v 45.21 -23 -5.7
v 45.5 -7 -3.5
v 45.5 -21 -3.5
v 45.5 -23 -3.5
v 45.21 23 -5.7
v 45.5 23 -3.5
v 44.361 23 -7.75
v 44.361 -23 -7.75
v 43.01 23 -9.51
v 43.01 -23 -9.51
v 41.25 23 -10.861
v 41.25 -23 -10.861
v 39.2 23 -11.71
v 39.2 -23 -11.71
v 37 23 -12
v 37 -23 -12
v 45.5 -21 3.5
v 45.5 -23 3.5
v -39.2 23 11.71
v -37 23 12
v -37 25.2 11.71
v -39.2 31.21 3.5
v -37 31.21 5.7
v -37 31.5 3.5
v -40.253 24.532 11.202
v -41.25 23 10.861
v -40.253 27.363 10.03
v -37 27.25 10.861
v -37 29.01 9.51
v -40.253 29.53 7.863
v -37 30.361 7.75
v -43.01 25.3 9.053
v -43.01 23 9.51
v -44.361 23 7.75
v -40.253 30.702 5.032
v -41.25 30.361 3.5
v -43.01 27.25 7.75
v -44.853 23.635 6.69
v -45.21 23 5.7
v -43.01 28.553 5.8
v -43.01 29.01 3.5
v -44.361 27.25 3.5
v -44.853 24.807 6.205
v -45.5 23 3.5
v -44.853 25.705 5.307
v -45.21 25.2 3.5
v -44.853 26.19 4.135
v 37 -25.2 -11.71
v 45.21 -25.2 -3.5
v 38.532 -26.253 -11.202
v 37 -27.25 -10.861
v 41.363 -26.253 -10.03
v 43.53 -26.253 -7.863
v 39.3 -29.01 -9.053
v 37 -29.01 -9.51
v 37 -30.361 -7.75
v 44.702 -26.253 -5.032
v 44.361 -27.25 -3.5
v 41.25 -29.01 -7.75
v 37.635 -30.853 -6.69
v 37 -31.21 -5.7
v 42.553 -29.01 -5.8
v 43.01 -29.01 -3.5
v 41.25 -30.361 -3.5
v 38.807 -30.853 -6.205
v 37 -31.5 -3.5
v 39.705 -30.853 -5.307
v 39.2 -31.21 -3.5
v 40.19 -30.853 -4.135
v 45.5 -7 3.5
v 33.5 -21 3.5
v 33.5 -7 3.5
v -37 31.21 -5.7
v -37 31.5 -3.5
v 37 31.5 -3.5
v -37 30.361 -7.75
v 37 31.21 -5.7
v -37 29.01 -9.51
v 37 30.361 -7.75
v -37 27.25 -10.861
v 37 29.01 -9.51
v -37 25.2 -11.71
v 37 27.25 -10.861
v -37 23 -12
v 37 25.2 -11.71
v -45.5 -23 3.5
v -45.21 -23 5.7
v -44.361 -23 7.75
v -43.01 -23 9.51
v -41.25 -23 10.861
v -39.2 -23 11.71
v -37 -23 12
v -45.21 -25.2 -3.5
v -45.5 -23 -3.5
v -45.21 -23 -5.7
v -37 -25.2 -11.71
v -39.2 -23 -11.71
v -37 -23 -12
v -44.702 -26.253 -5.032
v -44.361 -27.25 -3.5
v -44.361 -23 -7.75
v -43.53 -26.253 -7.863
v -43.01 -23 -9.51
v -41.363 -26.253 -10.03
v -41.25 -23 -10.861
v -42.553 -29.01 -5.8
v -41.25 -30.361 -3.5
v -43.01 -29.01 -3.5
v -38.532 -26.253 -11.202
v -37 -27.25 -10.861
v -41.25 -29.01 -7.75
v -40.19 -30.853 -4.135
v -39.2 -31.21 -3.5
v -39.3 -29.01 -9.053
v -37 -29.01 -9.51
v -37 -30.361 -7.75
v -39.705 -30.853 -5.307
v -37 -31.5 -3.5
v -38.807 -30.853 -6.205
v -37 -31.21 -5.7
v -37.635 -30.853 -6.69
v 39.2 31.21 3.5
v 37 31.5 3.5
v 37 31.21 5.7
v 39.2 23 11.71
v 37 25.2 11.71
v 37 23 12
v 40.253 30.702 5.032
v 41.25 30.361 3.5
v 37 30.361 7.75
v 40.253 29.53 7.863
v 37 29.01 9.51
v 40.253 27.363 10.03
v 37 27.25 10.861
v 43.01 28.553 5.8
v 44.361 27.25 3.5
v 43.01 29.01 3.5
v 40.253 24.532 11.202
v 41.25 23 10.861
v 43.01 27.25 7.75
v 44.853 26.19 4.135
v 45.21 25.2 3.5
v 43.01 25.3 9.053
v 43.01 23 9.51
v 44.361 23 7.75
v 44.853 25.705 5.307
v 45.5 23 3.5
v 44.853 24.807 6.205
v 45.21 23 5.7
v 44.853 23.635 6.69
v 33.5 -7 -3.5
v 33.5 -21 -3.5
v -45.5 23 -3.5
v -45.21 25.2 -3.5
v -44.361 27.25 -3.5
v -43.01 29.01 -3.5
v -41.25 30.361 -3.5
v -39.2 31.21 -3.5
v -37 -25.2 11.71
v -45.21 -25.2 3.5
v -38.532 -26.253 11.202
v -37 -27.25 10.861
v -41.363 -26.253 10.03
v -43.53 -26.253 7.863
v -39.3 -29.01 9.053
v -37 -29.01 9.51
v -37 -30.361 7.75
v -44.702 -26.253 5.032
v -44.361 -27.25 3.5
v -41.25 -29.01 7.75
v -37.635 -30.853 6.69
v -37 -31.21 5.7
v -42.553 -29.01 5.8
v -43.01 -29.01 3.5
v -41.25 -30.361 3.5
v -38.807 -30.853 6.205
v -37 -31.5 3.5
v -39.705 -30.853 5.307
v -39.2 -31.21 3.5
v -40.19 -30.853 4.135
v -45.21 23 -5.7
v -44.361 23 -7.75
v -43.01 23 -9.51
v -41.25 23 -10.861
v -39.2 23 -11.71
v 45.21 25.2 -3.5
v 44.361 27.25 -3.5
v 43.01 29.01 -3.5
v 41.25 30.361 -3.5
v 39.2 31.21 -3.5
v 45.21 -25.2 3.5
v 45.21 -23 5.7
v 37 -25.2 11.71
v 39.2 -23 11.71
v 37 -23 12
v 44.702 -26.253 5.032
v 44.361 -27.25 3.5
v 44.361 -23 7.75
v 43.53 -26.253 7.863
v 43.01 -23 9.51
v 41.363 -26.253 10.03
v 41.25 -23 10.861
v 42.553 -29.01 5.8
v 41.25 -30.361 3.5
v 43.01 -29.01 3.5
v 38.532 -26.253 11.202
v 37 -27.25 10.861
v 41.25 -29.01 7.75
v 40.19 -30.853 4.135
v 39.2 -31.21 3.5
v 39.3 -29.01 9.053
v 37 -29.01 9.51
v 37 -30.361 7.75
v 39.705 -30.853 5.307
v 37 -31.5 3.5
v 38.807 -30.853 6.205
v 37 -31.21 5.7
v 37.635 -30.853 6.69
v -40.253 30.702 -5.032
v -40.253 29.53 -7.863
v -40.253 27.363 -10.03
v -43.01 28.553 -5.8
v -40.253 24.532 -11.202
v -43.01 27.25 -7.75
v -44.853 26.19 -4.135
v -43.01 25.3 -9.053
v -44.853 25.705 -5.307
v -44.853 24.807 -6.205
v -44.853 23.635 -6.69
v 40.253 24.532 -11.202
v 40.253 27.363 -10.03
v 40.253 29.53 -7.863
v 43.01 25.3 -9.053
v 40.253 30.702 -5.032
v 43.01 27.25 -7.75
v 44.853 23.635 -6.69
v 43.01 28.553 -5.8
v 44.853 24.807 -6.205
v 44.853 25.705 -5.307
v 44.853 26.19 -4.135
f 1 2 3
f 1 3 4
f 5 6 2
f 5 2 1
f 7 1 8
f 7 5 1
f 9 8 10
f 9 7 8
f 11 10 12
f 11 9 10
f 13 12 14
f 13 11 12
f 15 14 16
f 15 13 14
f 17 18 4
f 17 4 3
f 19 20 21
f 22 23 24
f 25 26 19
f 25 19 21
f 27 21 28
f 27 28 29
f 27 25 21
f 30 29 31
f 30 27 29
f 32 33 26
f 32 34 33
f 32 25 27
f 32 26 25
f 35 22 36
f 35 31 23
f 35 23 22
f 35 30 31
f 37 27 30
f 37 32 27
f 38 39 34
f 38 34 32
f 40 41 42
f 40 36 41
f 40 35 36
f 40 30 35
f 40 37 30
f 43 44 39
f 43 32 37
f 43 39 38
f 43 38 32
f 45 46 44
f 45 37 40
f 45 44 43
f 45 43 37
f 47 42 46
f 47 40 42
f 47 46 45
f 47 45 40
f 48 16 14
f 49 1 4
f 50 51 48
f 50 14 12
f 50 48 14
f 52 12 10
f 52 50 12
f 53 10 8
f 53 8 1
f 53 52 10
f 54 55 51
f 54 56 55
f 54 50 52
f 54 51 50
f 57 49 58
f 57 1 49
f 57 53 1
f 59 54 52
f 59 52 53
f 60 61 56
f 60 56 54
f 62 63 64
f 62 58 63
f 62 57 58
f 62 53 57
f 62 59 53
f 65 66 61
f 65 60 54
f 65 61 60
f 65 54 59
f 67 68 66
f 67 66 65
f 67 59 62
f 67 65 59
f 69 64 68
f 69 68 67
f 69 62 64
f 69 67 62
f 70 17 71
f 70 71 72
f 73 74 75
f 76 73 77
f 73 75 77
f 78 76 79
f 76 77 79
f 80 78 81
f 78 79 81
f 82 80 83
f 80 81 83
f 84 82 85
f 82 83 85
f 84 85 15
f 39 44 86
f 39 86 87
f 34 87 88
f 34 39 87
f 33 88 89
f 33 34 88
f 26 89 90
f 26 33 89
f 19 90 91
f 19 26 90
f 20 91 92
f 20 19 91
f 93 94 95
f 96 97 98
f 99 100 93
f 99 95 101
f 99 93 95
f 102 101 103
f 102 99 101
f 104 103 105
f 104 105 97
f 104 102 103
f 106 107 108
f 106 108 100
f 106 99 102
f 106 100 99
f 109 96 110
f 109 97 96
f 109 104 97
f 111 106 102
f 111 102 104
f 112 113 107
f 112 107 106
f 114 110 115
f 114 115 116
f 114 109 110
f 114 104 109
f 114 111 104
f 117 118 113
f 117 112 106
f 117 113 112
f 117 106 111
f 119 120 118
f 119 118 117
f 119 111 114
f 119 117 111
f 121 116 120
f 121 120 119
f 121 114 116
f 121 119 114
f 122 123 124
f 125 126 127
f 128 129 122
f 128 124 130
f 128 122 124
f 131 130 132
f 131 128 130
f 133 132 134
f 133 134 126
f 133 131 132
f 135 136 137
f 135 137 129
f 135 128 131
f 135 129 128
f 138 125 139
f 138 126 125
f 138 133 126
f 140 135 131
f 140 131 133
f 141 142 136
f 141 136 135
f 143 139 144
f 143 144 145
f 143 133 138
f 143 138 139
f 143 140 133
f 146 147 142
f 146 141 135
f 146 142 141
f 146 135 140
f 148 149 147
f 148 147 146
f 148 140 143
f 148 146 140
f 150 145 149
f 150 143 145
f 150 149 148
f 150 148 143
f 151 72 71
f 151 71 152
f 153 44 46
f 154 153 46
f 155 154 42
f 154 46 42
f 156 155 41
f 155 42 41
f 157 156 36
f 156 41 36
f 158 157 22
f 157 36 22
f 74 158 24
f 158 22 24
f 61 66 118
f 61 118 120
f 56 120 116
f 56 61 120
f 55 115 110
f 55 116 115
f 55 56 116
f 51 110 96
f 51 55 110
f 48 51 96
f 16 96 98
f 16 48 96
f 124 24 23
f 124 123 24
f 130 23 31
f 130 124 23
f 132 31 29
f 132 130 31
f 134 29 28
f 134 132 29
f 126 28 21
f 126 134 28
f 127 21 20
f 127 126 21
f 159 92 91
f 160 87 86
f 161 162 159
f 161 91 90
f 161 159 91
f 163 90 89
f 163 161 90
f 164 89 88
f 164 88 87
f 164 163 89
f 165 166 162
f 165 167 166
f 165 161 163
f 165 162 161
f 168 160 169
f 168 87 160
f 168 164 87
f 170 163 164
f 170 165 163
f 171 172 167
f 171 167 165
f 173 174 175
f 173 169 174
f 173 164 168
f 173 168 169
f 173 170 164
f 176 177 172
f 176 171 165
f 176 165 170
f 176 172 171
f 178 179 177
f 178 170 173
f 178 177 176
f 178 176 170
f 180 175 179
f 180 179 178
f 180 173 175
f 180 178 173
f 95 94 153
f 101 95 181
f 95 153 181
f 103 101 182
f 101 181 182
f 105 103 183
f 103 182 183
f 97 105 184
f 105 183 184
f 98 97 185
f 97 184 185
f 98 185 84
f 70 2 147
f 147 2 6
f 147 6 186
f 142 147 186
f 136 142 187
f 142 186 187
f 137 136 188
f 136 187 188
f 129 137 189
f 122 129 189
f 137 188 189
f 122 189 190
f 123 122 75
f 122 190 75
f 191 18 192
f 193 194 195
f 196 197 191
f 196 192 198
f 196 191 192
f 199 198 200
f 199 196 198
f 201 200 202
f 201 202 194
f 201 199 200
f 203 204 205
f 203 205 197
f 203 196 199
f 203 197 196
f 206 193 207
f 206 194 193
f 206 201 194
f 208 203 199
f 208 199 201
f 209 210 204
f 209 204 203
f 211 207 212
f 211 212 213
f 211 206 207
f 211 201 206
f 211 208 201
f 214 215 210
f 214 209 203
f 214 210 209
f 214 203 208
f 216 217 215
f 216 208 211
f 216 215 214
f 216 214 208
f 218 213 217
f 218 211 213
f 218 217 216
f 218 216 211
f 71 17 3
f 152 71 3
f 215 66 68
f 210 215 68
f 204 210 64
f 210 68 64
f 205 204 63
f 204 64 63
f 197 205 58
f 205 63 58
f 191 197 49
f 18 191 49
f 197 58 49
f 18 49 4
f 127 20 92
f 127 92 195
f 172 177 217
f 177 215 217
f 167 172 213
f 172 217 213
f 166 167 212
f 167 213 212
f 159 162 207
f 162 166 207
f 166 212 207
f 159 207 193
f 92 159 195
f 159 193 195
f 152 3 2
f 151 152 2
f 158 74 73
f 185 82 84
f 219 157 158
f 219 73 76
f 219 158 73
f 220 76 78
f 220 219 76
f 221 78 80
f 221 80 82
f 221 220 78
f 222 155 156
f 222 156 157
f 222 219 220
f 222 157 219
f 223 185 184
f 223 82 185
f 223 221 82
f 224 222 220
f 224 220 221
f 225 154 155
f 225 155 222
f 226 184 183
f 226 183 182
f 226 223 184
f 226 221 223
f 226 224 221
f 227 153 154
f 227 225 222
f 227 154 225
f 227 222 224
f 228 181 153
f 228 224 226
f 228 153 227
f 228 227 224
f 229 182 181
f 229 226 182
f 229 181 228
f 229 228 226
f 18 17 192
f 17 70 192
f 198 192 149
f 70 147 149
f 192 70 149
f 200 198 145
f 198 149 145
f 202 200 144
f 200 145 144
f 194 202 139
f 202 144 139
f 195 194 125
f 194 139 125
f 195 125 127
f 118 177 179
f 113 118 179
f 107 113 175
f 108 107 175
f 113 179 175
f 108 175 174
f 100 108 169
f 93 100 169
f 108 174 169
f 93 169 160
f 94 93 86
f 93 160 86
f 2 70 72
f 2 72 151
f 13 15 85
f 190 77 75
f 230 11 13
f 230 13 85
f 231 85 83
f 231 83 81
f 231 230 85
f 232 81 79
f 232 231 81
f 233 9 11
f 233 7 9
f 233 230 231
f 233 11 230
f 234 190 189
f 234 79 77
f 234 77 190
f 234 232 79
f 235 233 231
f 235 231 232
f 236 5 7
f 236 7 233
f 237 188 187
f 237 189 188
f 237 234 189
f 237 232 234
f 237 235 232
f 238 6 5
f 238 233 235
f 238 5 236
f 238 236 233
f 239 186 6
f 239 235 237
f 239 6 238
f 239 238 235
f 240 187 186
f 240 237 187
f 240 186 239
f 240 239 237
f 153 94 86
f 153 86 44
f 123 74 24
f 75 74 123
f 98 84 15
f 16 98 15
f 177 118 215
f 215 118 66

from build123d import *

# Parameters (mm, degrees)
BOSS_EXTRUDE1_DEPTH      = 12
BOSS_EXTRUDE1_DEPTH_BACK = 12
SKETCH1_W                = 91
SKETCH1_H                = 63
FILLET1_R                = 8.5
FILLET2_R                = 8.5
SKETCH2_W                = 7
SKETCH2_H                = 14
CUT_EXTRUDE1_DEPTH       = 12


with BuildPart() as part:
    # Sketch1 → Boss-Extrude1 (new, two sides: drawn at the far end of the back side and taken through both)
    with BuildSketch(Plane.XY.offset(-BOSS_EXTRUDE1_DEPTH_BACK)):
        Rectangle(SKETCH1_W, SKETCH1_H)
    extrude(amount=BOSS_EXTRUDE1_DEPTH + BOSS_EXTRUDE1_DEPTH_BACK)

    # Fillet1
    fillet1_edges = [part.edges().sort_by_distance(p)[0] for p in [
        (45.5, 0, 12),
        (-45.5, 0, -12),
        (0, 31.5, 12),
        (-45.5, 0, 12),
        (0, -31.5, 12),
        (0, -31.5, -12),
        (45.5, 0, -12),
        (0, 31.5, -12),
    ]]
    fillet(fillet1_edges, radius=FILLET1_R)

    # Fillet2
    # the kernel refuses this fillet: 8.5 mm, written as the material it takes off along each edge
    with BuildSketch(Plane(origin=(37, -23, -3.5), x_dir=(1, 0, 0), z_dir=(0, -1, 0))) as fillet2_piece_1_section:
        Polygon((0, 0), (FILLET2_R, 0), (FILLET2_R, -FILLET2_R), (0, -FILLET2_R), align=None)
    fillet2_piece_1 = extrude(amount=FILLET2_R, mode=Mode.PRIVATE)
    fillet2_piece_1 = fillet2_piece_1 - Plane(origin=(37, -23, -3.5), x_dir=(-0.7071067811865475, 0, 0.7071067811865475), z_dir=(0, -1, 0)) * Sphere(FILLET2_R, mode=Mode.PRIVATE)
    add(fillet2_piece_1, mode=Mode.SUBTRACT)
    with BuildSketch(Plane(origin=(-37, -23, -3.5), x_dir=(-1, 0, 0), z_dir=(0, -1, 0))) as fillet2_piece_2_section:
        Polygon((0, 0), (FILLET2_R, 0), (FILLET2_R, FILLET2_R), (0, FILLET2_R), align=None)
    fillet2_piece_2 = extrude(amount=FILLET2_R, mode=Mode.PRIVATE)
    fillet2_piece_2 = fillet2_piece_2 - Plane(origin=(-37, -23, -3.5), x_dir=(0.7071067811865475, 0, 0.7071067811865475), z_dir=(0, -1, 0)) * Sphere(FILLET2_R, mode=Mode.PRIVATE)
    add(fillet2_piece_2, mode=Mode.SUBTRACT)
    with BuildSketch(Plane(origin=(37, 23, -3.5), x_dir=(0, 1, 0), z_dir=(1, 0, 0))) as fillet2_piece_3_section:
        Polygon((0, 0), (FILLET2_R, 0), (FILLET2_R, -FILLET2_R), (0, -FILLET2_R), align=None)
    fillet2_piece_3 = extrude(amount=FILLET2_R, mode=Mode.PRIVATE)
    fillet2_piece_3 = fillet2_piece_3 - Plane(origin=(37, 23, -3.5), x_dir=(0, -0.7071067811865475, 0.7071067811865475), z_dir=(1, 0, 0)) * Sphere(FILLET2_R, mode=Mode.PRIVATE)
    add(fillet2_piece_3, mode=Mode.SUBTRACT)
    with BuildSketch(Plane(origin=(-37, 23, -3.5), x_dir=(0, 1, 0), z_dir=(-1, 0, 0))) as fillet2_piece_4_section:
        Polygon((0, 0), (FILLET2_R, 0), (FILLET2_R, FILLET2_R), (0, FILLET2_R), align=None)
    fillet2_piece_4 = extrude(amount=FILLET2_R, mode=Mode.PRIVATE)
    fillet2_piece_4 = fillet2_piece_4 - Plane(origin=(-37, 23, -3.5), x_dir=(0, -0.7071067811865475, 0.7071067811865475), z_dir=(-1, 0, 0)) * Sphere(FILLET2_R, mode=Mode.PRIVATE)
    add(fillet2_piece_4, mode=Mode.SUBTRACT)
    with BuildSketch(Plane(origin=(-37, 23, 3.5), x_dir=(0, 1, 0), z_dir=(-1, 0, 0))) as fillet2_piece_5_section:
        Polygon((0, 0), (FILLET2_R, 0), (FILLET2_R, -FILLET2_R), (0, -FILLET2_R), align=None)
    fillet2_piece_5 = extrude(amount=FILLET2_R, mode=Mode.PRIVATE)
    fillet2_piece_5 = fillet2_piece_5 - Plane(origin=(-37, 23, 3.5), x_dir=(0, -0.7071067811865475, -0.7071067811865475), z_dir=(-1, 0, 0)) * Sphere(FILLET2_R, mode=Mode.PRIVATE)
    add(fillet2_piece_5, mode=Mode.SUBTRACT)
    with BuildSketch(Plane(origin=(37, 23, 3.5), x_dir=(0, 1, 0), z_dir=(1, 0, 0))) as fillet2_piece_6_section:
        Polygon((0, 0), (FILLET2_R, 0), (FILLET2_R, FILLET2_R), (0, FILLET2_R), align=None)
    fillet2_piece_6 = extrude(amount=FILLET2_R, mode=Mode.PRIVATE)
    fillet2_piece_6 = fillet2_piece_6 - Plane(origin=(37, 23, 3.5), x_dir=(0, -0.7071067811865475, -0.7071067811865475), z_dir=(1, 0, 0)) * Sphere(FILLET2_R, mode=Mode.PRIVATE)
    add(fillet2_piece_6, mode=Mode.SUBTRACT)
    with BuildSketch(Plane(origin=(-37, -23, 3.5), x_dir=(-1, 0, 0), z_dir=(0, -1, 0))) as fillet2_piece_7_section:
        Polygon((0, 0), (FILLET2_R, 0), (FILLET2_R, -FILLET2_R), (0, -FILLET2_R), align=None)
    fillet2_piece_7 = extrude(amount=FILLET2_R, mode=Mode.PRIVATE)
    fillet2_piece_7 = fillet2_piece_7 - Plane(origin=(-37, -23, 3.5), x_dir=(0.7071067811865475, 0, -0.7071067811865475), z_dir=(0, -1, 0)) * Sphere(FILLET2_R, mode=Mode.PRIVATE)
    add(fillet2_piece_7, mode=Mode.SUBTRACT)
    with BuildSketch(Plane(origin=(37, -23, 3.5), x_dir=(1, 0, 0), z_dir=(0, -1, 0))) as fillet2_piece_8_section:
        Polygon((0, 0), (FILLET2_R, 0), (FILLET2_R, FILLET2_R), (0, FILLET2_R), align=None)
    fillet2_piece_8 = extrude(amount=FILLET2_R, mode=Mode.PRIVATE)
    fillet2_piece_8 = fillet2_piece_8 - Plane(origin=(37, -23, 3.5), x_dir=(-0.7071067811865475, 0, -0.7071067811865475), z_dir=(0, -1, 0)) * Sphere(FILLET2_R, mode=Mode.PRIVATE)
    add(fillet2_piece_8, mode=Mode.SUBTRACT)
    with BuildSketch(Plane(origin=(-45.5, 31.5, 3.5), x_dir=(0, -1, 0), z_dir=(0, 0, -1)), Plane(origin=(45.5, 31.5, -3.5), x_dir=(0, -1, 0), z_dir=(0, 0, 1)), Plane(origin=(-45.5, -31.5, 3.5), x_dir=(1, 0, 0), z_dir=(0, 0, -1)), Plane(origin=(45.5, -31.5, -3.5), x_dir=(-1, 0, 0), z_dir=(0, 0, 1))) as fillet2_piece_9:
        with BuildLine():
            CenterArc((FILLET2_R, -FILLET2_R), FILLET2_R, 90, 90)
            Line((0, -FILLET2_R), (0, 0))
            Line((0, 0), (FILLET2_R, 0))
        make_face()
    extrude(amount=7, mode=Mode.SUBTRACT)

    # Sketch2 → Cut-Extrude1 (cut)
    with BuildSketch(Plane(origin=(45.5, 0, 0), x_dir=(0, 0, -1), z_dir=(1, 0, 0))):
        with Locations((0, -14)):
            Rectangle(SKETCH2_W, SKETCH2_H)
    extrude(amount=-CUT_EXTRUDE1_DEPTH, mode=Mode.SUBTRACT)


solid = part.part
